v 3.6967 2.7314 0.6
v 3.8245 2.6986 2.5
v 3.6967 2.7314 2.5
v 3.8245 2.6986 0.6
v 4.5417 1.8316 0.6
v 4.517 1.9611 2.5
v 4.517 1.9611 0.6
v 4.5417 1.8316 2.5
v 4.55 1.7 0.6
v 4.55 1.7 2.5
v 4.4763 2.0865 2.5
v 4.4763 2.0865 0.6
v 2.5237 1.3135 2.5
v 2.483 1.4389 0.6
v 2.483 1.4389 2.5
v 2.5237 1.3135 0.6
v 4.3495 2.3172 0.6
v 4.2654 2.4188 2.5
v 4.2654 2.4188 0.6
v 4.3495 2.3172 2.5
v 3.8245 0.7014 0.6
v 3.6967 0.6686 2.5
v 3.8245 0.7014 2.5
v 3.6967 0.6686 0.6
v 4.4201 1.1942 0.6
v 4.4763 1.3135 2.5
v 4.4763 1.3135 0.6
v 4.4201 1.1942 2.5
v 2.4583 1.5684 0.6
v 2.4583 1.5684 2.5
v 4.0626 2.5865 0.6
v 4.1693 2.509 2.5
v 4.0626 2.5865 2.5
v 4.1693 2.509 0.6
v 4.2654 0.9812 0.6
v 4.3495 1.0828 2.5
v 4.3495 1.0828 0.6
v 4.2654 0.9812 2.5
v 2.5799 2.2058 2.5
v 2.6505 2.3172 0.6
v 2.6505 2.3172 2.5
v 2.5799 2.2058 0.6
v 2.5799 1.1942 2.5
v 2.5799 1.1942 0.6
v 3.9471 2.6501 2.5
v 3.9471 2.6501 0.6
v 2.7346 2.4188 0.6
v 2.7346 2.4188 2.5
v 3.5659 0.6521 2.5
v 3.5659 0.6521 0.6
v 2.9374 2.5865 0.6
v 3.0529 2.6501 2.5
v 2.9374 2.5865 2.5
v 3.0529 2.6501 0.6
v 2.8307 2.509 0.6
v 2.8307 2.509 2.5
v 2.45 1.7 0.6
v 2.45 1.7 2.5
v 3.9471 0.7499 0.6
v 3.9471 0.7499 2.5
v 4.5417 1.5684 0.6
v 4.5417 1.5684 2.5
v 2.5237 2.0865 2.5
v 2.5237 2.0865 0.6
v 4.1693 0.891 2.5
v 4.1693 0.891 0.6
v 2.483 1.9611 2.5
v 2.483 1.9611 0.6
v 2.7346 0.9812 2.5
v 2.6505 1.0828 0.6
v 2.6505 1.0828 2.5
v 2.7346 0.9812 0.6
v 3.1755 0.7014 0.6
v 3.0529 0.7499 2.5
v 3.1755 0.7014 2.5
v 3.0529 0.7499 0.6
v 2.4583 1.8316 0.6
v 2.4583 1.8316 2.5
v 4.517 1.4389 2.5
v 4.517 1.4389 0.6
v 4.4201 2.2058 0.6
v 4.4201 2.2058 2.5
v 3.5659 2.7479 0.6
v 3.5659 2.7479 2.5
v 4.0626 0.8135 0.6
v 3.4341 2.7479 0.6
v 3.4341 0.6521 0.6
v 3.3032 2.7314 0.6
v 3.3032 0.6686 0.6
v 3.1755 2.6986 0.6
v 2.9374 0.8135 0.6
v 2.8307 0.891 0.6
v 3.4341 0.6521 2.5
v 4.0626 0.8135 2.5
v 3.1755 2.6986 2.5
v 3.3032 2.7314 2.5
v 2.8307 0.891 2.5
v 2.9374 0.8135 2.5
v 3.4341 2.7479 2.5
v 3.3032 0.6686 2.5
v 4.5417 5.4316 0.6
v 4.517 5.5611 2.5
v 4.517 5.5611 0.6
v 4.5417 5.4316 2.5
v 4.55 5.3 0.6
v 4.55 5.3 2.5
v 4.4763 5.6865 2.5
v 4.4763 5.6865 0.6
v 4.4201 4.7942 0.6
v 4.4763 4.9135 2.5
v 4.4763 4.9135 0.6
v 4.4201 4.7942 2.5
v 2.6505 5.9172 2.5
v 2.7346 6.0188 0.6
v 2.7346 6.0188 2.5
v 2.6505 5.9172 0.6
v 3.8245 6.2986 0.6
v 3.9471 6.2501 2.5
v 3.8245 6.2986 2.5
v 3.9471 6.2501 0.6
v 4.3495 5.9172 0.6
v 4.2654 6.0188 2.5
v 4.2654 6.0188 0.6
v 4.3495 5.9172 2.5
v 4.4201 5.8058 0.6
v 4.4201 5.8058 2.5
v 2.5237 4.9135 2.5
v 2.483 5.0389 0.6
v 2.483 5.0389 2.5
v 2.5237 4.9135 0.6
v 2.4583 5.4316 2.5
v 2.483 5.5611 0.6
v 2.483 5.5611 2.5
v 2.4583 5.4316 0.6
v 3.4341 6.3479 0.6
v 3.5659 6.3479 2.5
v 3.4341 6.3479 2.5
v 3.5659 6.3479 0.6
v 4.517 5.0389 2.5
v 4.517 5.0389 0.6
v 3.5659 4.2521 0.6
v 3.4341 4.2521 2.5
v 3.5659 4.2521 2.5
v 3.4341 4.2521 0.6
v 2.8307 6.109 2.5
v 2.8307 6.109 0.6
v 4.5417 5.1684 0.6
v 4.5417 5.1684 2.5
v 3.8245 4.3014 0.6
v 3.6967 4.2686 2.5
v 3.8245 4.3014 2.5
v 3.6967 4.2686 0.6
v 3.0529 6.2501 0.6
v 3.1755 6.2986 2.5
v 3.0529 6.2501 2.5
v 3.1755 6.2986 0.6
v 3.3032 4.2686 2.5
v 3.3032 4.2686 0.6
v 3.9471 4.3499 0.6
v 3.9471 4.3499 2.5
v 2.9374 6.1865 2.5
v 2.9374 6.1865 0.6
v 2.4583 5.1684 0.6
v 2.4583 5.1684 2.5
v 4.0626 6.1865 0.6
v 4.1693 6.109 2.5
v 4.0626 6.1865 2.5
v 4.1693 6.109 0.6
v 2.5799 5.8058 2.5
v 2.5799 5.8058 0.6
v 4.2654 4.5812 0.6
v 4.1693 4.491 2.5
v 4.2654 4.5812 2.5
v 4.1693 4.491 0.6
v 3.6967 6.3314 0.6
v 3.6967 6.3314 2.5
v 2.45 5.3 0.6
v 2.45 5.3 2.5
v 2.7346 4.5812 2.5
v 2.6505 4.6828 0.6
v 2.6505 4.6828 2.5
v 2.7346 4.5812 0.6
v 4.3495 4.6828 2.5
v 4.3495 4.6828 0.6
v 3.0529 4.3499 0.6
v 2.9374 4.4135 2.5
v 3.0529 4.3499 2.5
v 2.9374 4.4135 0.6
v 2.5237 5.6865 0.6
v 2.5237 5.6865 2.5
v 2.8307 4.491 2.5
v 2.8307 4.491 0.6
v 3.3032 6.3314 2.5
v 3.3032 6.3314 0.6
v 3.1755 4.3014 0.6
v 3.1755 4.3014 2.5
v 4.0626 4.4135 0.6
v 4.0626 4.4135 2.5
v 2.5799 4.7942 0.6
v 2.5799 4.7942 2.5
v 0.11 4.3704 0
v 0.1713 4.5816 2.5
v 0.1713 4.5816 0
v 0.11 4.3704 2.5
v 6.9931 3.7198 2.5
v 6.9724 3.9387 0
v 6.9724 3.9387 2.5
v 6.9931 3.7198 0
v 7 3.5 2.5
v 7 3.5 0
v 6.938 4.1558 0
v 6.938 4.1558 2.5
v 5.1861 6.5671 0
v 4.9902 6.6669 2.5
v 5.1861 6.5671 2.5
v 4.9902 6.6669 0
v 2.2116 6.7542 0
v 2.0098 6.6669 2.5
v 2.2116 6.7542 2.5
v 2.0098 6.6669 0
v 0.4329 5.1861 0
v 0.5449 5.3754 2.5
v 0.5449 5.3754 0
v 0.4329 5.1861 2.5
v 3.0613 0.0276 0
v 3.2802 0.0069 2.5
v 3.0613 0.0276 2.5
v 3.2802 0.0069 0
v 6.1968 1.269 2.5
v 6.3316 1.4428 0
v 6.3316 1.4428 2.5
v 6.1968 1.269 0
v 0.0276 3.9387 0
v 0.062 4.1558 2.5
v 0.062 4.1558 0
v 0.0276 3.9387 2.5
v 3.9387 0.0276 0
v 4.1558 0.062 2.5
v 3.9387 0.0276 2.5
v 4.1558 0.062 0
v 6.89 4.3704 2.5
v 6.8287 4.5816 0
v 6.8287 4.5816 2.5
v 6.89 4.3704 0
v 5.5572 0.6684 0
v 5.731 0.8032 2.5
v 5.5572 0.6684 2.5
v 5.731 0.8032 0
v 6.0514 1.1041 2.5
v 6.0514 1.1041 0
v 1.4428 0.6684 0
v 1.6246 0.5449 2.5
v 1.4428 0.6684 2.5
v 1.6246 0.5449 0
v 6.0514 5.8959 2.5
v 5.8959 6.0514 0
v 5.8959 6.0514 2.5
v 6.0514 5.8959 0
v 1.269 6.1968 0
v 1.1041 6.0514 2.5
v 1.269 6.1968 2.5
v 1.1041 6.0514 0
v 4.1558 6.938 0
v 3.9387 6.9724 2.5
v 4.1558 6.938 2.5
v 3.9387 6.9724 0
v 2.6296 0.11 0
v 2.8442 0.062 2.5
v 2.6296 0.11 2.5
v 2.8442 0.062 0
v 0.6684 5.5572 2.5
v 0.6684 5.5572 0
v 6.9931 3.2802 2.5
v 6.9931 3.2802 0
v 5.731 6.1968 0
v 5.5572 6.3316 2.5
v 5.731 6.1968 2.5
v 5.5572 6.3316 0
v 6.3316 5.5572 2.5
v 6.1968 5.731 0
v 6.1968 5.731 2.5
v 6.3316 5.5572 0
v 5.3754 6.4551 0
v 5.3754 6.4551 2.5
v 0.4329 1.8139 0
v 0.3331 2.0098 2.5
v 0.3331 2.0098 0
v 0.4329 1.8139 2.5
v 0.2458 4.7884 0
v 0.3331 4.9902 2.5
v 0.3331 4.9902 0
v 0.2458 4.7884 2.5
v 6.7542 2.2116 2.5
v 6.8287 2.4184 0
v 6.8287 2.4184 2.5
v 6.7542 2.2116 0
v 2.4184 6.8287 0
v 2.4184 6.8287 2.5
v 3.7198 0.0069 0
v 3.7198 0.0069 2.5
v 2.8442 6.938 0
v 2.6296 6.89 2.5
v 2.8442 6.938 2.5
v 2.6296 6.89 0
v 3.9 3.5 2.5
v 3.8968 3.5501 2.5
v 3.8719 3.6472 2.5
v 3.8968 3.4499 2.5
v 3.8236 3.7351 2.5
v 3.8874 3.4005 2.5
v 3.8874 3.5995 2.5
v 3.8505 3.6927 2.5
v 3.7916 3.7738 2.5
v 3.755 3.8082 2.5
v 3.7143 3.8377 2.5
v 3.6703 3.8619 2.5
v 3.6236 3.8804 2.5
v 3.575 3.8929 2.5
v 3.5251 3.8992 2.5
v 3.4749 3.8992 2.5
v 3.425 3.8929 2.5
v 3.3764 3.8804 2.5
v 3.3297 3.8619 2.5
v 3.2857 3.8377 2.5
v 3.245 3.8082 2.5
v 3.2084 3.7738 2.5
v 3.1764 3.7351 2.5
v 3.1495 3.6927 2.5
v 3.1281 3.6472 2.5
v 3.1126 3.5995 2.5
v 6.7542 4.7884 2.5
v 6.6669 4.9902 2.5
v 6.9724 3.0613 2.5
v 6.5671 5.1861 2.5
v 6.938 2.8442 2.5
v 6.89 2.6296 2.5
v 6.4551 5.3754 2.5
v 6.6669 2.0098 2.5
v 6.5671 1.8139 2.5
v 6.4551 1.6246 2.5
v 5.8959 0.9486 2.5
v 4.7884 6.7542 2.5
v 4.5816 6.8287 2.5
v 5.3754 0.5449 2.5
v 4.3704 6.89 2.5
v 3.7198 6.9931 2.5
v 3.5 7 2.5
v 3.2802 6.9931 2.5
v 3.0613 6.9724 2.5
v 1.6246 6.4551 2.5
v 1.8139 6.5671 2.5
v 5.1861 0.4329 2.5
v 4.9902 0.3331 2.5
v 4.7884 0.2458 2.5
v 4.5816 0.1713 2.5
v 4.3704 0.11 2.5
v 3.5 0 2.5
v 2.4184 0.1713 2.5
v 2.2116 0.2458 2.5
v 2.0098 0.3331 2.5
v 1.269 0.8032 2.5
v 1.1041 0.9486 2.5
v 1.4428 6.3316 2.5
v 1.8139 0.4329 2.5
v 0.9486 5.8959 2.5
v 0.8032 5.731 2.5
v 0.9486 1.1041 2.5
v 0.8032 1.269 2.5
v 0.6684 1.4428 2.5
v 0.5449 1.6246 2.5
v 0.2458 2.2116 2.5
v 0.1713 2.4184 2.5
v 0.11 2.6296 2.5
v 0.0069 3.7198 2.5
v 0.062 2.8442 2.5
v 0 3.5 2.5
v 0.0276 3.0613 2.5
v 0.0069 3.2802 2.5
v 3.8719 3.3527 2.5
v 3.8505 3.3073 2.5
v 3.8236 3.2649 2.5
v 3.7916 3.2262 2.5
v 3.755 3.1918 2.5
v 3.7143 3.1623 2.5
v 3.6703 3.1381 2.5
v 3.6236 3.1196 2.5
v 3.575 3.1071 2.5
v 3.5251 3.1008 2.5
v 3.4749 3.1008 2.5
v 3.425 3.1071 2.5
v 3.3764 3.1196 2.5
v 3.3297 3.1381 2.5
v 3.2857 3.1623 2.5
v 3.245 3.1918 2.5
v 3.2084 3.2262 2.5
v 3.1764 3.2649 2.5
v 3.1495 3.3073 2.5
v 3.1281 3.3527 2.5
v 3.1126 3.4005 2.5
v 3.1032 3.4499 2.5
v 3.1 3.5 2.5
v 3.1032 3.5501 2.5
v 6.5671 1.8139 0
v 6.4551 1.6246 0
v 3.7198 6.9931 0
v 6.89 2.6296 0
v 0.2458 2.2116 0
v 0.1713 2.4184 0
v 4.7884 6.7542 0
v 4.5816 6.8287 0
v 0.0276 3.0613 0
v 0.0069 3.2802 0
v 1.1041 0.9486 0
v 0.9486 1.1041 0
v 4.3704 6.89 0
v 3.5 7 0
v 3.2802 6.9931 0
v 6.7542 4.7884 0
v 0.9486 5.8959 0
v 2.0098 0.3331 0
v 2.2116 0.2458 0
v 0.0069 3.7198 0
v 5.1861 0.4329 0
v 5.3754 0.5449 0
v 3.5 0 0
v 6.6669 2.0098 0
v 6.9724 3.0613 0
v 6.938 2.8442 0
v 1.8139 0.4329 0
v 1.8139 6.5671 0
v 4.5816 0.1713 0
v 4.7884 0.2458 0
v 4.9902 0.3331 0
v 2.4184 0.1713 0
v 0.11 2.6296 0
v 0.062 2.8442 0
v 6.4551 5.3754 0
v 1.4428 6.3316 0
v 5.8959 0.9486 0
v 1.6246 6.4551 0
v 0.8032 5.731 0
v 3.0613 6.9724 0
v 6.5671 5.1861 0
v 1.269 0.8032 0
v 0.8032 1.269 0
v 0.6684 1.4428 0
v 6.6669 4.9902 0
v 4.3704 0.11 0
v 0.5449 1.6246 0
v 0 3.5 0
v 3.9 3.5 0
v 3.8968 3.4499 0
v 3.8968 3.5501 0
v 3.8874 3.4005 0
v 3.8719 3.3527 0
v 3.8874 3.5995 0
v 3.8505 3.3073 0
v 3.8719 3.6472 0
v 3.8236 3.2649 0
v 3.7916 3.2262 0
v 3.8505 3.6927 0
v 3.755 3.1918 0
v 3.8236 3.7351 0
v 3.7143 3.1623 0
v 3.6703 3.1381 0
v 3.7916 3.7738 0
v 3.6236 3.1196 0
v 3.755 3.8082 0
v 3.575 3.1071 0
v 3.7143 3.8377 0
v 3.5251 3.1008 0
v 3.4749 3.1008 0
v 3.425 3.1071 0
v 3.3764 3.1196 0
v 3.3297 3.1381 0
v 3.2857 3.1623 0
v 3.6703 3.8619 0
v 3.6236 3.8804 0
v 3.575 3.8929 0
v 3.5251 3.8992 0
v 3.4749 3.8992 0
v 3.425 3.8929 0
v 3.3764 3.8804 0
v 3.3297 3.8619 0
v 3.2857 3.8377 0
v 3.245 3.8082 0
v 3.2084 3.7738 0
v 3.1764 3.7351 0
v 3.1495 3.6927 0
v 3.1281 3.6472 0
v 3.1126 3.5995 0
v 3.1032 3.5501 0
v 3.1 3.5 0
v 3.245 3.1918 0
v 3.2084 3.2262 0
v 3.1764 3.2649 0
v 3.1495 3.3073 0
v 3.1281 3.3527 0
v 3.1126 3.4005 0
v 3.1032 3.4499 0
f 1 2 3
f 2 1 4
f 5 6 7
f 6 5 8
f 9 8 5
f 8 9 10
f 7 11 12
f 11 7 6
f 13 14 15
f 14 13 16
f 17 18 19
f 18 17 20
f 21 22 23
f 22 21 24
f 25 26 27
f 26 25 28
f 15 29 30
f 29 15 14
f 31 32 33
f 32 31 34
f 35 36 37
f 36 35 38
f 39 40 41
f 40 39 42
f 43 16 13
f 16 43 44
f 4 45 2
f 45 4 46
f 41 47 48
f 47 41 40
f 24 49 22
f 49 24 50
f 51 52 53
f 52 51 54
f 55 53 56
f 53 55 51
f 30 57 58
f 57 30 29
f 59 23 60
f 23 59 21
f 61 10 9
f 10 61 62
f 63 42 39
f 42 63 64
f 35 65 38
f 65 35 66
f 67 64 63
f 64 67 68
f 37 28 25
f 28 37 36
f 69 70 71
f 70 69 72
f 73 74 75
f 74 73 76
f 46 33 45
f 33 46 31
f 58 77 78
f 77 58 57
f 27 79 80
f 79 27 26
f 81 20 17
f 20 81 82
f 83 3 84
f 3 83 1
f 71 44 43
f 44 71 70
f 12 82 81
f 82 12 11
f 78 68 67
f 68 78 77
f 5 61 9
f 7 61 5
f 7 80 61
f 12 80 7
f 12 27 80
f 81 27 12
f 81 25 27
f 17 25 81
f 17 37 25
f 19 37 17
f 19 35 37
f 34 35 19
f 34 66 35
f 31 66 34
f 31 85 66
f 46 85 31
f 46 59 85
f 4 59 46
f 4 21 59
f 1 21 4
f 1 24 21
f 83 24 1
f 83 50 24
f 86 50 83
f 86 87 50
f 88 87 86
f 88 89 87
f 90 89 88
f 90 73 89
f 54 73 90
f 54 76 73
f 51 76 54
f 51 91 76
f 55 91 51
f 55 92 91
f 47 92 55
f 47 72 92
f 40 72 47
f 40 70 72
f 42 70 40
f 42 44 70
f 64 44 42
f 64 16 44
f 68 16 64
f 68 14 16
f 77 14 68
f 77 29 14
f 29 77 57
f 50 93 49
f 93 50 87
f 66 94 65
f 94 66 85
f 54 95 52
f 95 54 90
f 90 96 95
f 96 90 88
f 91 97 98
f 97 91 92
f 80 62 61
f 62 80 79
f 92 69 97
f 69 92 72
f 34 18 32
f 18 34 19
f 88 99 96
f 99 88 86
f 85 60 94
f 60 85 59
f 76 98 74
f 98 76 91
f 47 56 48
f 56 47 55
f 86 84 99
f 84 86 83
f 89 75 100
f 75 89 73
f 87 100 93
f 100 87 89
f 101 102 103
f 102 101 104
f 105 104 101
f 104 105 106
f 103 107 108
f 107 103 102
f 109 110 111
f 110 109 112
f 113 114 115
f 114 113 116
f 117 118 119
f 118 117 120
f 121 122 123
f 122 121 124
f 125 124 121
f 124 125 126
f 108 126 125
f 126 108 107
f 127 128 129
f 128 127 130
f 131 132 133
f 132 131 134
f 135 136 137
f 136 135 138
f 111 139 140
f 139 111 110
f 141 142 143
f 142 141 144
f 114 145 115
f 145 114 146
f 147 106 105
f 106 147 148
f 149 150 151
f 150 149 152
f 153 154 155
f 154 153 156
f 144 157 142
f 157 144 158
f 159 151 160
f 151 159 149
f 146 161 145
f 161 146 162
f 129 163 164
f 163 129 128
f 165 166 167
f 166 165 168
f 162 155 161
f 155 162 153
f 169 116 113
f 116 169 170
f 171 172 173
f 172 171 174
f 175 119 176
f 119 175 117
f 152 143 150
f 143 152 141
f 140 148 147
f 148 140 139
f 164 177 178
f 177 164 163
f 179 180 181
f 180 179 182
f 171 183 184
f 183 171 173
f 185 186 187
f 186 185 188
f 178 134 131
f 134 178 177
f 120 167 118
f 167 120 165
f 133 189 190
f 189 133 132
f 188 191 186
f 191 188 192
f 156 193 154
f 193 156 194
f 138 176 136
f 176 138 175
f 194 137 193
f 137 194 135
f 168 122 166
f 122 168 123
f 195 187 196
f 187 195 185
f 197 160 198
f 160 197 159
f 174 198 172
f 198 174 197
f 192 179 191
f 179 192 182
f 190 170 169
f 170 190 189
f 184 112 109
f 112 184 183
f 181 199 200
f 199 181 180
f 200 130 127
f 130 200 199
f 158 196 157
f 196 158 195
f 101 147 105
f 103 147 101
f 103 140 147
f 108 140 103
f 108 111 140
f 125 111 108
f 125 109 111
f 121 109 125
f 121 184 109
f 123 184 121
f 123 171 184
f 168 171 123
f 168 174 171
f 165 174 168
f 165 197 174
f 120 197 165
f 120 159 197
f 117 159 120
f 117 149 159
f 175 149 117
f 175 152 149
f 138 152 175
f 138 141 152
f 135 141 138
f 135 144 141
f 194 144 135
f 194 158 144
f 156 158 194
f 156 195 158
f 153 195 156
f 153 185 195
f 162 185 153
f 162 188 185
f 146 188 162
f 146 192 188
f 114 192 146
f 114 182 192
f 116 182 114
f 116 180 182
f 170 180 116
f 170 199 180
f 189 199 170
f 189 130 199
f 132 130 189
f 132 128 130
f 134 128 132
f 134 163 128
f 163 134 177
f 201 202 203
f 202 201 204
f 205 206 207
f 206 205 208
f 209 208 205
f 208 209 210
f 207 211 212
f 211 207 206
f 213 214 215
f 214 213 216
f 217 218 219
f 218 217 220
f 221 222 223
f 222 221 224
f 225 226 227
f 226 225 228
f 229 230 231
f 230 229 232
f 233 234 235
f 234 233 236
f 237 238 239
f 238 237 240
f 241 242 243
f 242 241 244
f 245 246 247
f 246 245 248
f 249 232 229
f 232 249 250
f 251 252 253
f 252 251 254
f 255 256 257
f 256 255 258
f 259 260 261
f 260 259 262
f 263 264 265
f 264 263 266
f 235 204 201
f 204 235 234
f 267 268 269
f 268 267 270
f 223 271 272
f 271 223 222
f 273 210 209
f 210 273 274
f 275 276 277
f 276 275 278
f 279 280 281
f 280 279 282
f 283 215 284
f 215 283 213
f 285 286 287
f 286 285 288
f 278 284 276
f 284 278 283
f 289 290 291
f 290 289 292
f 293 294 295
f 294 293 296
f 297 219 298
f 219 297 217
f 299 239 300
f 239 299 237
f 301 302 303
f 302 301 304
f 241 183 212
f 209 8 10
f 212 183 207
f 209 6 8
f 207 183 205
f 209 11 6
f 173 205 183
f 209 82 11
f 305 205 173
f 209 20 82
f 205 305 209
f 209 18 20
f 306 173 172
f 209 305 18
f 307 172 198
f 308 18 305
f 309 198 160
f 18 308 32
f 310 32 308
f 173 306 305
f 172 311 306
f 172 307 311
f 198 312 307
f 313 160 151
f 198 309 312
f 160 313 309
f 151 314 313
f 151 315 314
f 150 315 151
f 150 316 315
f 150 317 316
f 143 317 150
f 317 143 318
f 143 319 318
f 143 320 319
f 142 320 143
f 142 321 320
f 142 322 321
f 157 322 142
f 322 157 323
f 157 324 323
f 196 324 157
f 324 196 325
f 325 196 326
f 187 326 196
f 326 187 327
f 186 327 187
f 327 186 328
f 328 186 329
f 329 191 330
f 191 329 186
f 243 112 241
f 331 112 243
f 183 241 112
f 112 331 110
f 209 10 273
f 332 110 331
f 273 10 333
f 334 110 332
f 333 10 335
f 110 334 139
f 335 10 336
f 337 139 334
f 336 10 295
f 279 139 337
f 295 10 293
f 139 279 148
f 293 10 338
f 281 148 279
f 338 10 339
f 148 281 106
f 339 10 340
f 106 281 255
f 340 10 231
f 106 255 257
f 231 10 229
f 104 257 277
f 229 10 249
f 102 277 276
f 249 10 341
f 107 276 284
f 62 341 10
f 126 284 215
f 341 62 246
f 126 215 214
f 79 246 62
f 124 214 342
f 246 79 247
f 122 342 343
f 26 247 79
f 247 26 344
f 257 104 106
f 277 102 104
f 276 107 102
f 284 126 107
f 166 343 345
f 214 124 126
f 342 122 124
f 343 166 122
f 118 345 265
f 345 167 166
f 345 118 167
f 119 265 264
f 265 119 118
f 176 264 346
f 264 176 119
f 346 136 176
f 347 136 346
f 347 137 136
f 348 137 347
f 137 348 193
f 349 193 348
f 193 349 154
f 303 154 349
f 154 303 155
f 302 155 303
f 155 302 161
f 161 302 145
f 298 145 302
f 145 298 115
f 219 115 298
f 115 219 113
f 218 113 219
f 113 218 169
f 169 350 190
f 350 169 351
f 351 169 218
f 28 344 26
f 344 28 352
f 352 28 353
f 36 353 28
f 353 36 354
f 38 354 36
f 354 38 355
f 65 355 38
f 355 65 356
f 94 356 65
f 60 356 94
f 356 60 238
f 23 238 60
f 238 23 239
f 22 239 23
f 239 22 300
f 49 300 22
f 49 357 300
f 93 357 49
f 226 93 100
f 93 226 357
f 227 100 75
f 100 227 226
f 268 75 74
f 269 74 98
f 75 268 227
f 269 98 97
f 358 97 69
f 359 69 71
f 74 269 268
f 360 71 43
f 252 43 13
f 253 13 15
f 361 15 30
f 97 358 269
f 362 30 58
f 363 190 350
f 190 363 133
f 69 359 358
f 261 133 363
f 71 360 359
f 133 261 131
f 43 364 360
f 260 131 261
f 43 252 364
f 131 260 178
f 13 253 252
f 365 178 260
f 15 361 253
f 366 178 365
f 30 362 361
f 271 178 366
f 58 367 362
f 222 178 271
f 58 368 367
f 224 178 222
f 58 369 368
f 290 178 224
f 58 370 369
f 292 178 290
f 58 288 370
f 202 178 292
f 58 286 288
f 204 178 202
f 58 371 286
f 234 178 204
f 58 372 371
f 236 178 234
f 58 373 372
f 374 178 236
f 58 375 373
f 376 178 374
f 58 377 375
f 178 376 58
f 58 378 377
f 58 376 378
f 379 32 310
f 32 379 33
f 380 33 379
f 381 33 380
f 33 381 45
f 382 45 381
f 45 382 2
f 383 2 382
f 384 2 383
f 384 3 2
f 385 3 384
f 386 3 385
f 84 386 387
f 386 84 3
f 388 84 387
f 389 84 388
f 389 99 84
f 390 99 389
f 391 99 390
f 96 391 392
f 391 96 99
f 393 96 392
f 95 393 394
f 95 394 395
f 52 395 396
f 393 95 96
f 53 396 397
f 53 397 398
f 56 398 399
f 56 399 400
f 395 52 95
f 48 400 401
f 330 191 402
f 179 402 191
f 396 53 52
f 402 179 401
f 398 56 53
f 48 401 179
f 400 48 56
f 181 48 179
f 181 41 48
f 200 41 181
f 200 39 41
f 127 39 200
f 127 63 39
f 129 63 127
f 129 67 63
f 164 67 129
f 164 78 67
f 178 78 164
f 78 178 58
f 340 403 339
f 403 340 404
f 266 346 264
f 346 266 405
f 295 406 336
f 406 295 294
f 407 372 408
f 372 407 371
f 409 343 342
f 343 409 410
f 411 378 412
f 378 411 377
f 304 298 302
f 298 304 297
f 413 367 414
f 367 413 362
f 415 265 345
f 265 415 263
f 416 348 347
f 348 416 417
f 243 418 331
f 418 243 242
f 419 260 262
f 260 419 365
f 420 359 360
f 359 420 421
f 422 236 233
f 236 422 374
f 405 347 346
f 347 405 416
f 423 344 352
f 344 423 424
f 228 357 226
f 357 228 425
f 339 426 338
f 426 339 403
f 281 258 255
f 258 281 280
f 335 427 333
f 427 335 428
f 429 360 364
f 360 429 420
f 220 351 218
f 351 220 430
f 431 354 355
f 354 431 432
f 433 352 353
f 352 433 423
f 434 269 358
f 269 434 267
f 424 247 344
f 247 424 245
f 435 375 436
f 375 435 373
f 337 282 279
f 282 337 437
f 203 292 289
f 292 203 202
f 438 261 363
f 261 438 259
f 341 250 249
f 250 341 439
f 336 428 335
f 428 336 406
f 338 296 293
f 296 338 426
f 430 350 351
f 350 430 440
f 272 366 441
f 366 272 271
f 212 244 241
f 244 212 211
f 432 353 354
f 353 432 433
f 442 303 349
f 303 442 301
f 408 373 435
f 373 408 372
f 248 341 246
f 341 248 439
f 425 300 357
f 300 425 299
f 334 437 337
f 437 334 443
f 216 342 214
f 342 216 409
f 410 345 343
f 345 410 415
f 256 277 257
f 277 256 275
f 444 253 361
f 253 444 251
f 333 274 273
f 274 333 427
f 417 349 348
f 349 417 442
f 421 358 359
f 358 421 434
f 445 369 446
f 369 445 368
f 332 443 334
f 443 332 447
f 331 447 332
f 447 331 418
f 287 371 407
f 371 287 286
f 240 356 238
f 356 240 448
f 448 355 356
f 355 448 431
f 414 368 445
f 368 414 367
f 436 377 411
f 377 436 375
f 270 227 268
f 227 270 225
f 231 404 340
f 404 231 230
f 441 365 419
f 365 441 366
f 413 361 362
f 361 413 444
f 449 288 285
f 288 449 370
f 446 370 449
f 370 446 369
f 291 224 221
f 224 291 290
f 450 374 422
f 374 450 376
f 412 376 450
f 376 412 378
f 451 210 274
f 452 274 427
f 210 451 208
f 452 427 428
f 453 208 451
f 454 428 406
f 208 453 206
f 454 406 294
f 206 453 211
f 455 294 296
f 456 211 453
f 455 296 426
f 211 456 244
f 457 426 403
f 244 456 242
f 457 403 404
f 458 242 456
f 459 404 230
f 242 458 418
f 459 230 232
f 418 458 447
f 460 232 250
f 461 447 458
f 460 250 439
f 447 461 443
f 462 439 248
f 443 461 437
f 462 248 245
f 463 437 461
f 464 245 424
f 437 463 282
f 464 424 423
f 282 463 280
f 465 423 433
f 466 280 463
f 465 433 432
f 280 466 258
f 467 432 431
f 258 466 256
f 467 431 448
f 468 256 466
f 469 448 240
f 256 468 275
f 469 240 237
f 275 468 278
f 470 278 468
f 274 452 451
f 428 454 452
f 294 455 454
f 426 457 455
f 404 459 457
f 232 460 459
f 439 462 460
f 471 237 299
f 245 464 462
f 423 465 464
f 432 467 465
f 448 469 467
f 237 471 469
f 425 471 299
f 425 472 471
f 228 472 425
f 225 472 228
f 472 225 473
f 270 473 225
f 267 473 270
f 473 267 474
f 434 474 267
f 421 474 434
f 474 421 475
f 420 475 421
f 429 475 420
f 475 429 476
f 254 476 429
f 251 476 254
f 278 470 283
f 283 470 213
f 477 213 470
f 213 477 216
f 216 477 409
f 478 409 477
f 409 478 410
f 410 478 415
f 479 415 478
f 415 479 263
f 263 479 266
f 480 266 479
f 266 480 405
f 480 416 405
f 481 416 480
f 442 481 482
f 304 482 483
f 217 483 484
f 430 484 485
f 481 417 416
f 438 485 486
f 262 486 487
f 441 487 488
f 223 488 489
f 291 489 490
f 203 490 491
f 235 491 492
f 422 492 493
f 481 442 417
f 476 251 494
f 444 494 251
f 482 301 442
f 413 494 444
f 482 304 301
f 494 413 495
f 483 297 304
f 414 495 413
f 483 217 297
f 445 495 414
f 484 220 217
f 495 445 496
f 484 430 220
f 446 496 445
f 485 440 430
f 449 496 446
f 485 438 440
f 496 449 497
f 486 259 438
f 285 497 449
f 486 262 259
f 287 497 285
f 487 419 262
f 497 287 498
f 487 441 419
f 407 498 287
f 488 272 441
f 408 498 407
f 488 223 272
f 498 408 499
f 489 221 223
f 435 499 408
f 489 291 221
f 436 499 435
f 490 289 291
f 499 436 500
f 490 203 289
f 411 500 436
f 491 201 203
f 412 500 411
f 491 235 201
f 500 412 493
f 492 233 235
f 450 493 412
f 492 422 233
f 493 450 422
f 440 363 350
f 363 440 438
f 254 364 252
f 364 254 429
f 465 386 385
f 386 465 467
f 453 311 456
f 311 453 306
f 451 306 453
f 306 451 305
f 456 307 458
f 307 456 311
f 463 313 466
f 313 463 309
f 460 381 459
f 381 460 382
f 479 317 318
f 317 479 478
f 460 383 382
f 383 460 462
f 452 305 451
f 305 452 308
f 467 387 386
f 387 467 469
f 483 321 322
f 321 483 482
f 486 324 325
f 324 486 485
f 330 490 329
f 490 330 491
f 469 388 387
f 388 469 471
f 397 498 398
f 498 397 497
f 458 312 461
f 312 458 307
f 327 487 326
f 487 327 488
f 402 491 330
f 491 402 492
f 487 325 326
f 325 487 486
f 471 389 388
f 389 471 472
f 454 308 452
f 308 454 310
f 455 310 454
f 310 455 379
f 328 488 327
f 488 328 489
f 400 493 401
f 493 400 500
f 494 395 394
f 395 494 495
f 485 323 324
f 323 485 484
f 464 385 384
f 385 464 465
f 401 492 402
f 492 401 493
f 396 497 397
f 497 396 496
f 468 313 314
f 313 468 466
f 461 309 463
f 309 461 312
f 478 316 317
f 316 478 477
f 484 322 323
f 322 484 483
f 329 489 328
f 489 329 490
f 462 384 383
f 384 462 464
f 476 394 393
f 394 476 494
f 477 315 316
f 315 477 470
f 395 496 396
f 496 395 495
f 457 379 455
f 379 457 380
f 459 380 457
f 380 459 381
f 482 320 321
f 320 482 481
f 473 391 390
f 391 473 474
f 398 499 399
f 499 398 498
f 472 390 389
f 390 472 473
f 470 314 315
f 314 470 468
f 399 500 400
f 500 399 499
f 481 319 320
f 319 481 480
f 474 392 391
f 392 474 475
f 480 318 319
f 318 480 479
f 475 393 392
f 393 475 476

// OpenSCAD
//KD_BZ-3D_magnet_holder.scad
//09/02/2016    Kevin Donkers, Cronin Group, University of Glasgow
//OpenSCAD file creating a 3D model of a holder for two magnets to be attached at the end of a motor shaft
//All values in mm.

//Motor shaft paramters
shtshape = "cylinder";  //shaft shape
shtd=0.8;       //shaft diameter
shtl=4.5;       //shaft length

//Magnet parameters
magshape = "cylinder";  //magnet shape
magd = 2.1;       //magnet diameter (cylinder)
magh = 2;       //magnet height (cylinder)
magx = 1;       //magnet width (cube)
magy = 1;       //magnet length (cube)
magz = 1;       //magnet depth (cube)
mags = 1.5;       //magnet spacing

//Holder parameters
hldshape = "cylinder";  //holder shape
hldd = 7;           //holder diameter (cylinder)
hldh = 2.5;           //holder height (cylinder)
hldx = 4;           //holder width (cube)
hldy = 7;           //holder length (cube)
hldz = 2.5;           //holder depth (cube)

//Set translation parameters
x= hldshape=="cube" ? hldx : hldd;
y= hldshape=="cube" ? hldy : hldd;
z= hldshape=="cube" ? hldz : hldh;

//Construct 
difference(){
    //Holder
    if (hldshape=="cylinder"){
        translate([hldd/2,hldd/2,0])
        cylinder(h=hldh,d=hldd,center=false,$fn=100);
    }
    else if (hldshape=="cube"){
        cube([hldx,hldy,hldz],center=false);
    }
    //Magnets
    if (magshape=="cylinder"){
        translate([x/2,y/2-magd/2-mags/2,z-magh+0.1])
        cylinder(h=magh,d=magd,center=false,$fn=50);
        translate([x/2,y/2+magd/2+mags/2,z-magh+0.1])
        cylinder(h=magh,d=magd,center=false,$fn=50);
    }
    else if (magshape=="cube"){
        translate([x/2,y/2-magy/2-mags/2,z-magz/2+0.1])
        cube([magx,magy,magz],center=true);
        translate([x/2,y/2+magy/2+mags/2,z-magz/2+0.1])
        cube([magx,magy,magz],center=true);
    }
    //Shaft
    if (shtshape=="cylinder"){
        translate([x/2,y/2,-shtl+z+0.1])
        cylinder(h=shtl,d=shtd,center=false,$fn=50);
    }
}
